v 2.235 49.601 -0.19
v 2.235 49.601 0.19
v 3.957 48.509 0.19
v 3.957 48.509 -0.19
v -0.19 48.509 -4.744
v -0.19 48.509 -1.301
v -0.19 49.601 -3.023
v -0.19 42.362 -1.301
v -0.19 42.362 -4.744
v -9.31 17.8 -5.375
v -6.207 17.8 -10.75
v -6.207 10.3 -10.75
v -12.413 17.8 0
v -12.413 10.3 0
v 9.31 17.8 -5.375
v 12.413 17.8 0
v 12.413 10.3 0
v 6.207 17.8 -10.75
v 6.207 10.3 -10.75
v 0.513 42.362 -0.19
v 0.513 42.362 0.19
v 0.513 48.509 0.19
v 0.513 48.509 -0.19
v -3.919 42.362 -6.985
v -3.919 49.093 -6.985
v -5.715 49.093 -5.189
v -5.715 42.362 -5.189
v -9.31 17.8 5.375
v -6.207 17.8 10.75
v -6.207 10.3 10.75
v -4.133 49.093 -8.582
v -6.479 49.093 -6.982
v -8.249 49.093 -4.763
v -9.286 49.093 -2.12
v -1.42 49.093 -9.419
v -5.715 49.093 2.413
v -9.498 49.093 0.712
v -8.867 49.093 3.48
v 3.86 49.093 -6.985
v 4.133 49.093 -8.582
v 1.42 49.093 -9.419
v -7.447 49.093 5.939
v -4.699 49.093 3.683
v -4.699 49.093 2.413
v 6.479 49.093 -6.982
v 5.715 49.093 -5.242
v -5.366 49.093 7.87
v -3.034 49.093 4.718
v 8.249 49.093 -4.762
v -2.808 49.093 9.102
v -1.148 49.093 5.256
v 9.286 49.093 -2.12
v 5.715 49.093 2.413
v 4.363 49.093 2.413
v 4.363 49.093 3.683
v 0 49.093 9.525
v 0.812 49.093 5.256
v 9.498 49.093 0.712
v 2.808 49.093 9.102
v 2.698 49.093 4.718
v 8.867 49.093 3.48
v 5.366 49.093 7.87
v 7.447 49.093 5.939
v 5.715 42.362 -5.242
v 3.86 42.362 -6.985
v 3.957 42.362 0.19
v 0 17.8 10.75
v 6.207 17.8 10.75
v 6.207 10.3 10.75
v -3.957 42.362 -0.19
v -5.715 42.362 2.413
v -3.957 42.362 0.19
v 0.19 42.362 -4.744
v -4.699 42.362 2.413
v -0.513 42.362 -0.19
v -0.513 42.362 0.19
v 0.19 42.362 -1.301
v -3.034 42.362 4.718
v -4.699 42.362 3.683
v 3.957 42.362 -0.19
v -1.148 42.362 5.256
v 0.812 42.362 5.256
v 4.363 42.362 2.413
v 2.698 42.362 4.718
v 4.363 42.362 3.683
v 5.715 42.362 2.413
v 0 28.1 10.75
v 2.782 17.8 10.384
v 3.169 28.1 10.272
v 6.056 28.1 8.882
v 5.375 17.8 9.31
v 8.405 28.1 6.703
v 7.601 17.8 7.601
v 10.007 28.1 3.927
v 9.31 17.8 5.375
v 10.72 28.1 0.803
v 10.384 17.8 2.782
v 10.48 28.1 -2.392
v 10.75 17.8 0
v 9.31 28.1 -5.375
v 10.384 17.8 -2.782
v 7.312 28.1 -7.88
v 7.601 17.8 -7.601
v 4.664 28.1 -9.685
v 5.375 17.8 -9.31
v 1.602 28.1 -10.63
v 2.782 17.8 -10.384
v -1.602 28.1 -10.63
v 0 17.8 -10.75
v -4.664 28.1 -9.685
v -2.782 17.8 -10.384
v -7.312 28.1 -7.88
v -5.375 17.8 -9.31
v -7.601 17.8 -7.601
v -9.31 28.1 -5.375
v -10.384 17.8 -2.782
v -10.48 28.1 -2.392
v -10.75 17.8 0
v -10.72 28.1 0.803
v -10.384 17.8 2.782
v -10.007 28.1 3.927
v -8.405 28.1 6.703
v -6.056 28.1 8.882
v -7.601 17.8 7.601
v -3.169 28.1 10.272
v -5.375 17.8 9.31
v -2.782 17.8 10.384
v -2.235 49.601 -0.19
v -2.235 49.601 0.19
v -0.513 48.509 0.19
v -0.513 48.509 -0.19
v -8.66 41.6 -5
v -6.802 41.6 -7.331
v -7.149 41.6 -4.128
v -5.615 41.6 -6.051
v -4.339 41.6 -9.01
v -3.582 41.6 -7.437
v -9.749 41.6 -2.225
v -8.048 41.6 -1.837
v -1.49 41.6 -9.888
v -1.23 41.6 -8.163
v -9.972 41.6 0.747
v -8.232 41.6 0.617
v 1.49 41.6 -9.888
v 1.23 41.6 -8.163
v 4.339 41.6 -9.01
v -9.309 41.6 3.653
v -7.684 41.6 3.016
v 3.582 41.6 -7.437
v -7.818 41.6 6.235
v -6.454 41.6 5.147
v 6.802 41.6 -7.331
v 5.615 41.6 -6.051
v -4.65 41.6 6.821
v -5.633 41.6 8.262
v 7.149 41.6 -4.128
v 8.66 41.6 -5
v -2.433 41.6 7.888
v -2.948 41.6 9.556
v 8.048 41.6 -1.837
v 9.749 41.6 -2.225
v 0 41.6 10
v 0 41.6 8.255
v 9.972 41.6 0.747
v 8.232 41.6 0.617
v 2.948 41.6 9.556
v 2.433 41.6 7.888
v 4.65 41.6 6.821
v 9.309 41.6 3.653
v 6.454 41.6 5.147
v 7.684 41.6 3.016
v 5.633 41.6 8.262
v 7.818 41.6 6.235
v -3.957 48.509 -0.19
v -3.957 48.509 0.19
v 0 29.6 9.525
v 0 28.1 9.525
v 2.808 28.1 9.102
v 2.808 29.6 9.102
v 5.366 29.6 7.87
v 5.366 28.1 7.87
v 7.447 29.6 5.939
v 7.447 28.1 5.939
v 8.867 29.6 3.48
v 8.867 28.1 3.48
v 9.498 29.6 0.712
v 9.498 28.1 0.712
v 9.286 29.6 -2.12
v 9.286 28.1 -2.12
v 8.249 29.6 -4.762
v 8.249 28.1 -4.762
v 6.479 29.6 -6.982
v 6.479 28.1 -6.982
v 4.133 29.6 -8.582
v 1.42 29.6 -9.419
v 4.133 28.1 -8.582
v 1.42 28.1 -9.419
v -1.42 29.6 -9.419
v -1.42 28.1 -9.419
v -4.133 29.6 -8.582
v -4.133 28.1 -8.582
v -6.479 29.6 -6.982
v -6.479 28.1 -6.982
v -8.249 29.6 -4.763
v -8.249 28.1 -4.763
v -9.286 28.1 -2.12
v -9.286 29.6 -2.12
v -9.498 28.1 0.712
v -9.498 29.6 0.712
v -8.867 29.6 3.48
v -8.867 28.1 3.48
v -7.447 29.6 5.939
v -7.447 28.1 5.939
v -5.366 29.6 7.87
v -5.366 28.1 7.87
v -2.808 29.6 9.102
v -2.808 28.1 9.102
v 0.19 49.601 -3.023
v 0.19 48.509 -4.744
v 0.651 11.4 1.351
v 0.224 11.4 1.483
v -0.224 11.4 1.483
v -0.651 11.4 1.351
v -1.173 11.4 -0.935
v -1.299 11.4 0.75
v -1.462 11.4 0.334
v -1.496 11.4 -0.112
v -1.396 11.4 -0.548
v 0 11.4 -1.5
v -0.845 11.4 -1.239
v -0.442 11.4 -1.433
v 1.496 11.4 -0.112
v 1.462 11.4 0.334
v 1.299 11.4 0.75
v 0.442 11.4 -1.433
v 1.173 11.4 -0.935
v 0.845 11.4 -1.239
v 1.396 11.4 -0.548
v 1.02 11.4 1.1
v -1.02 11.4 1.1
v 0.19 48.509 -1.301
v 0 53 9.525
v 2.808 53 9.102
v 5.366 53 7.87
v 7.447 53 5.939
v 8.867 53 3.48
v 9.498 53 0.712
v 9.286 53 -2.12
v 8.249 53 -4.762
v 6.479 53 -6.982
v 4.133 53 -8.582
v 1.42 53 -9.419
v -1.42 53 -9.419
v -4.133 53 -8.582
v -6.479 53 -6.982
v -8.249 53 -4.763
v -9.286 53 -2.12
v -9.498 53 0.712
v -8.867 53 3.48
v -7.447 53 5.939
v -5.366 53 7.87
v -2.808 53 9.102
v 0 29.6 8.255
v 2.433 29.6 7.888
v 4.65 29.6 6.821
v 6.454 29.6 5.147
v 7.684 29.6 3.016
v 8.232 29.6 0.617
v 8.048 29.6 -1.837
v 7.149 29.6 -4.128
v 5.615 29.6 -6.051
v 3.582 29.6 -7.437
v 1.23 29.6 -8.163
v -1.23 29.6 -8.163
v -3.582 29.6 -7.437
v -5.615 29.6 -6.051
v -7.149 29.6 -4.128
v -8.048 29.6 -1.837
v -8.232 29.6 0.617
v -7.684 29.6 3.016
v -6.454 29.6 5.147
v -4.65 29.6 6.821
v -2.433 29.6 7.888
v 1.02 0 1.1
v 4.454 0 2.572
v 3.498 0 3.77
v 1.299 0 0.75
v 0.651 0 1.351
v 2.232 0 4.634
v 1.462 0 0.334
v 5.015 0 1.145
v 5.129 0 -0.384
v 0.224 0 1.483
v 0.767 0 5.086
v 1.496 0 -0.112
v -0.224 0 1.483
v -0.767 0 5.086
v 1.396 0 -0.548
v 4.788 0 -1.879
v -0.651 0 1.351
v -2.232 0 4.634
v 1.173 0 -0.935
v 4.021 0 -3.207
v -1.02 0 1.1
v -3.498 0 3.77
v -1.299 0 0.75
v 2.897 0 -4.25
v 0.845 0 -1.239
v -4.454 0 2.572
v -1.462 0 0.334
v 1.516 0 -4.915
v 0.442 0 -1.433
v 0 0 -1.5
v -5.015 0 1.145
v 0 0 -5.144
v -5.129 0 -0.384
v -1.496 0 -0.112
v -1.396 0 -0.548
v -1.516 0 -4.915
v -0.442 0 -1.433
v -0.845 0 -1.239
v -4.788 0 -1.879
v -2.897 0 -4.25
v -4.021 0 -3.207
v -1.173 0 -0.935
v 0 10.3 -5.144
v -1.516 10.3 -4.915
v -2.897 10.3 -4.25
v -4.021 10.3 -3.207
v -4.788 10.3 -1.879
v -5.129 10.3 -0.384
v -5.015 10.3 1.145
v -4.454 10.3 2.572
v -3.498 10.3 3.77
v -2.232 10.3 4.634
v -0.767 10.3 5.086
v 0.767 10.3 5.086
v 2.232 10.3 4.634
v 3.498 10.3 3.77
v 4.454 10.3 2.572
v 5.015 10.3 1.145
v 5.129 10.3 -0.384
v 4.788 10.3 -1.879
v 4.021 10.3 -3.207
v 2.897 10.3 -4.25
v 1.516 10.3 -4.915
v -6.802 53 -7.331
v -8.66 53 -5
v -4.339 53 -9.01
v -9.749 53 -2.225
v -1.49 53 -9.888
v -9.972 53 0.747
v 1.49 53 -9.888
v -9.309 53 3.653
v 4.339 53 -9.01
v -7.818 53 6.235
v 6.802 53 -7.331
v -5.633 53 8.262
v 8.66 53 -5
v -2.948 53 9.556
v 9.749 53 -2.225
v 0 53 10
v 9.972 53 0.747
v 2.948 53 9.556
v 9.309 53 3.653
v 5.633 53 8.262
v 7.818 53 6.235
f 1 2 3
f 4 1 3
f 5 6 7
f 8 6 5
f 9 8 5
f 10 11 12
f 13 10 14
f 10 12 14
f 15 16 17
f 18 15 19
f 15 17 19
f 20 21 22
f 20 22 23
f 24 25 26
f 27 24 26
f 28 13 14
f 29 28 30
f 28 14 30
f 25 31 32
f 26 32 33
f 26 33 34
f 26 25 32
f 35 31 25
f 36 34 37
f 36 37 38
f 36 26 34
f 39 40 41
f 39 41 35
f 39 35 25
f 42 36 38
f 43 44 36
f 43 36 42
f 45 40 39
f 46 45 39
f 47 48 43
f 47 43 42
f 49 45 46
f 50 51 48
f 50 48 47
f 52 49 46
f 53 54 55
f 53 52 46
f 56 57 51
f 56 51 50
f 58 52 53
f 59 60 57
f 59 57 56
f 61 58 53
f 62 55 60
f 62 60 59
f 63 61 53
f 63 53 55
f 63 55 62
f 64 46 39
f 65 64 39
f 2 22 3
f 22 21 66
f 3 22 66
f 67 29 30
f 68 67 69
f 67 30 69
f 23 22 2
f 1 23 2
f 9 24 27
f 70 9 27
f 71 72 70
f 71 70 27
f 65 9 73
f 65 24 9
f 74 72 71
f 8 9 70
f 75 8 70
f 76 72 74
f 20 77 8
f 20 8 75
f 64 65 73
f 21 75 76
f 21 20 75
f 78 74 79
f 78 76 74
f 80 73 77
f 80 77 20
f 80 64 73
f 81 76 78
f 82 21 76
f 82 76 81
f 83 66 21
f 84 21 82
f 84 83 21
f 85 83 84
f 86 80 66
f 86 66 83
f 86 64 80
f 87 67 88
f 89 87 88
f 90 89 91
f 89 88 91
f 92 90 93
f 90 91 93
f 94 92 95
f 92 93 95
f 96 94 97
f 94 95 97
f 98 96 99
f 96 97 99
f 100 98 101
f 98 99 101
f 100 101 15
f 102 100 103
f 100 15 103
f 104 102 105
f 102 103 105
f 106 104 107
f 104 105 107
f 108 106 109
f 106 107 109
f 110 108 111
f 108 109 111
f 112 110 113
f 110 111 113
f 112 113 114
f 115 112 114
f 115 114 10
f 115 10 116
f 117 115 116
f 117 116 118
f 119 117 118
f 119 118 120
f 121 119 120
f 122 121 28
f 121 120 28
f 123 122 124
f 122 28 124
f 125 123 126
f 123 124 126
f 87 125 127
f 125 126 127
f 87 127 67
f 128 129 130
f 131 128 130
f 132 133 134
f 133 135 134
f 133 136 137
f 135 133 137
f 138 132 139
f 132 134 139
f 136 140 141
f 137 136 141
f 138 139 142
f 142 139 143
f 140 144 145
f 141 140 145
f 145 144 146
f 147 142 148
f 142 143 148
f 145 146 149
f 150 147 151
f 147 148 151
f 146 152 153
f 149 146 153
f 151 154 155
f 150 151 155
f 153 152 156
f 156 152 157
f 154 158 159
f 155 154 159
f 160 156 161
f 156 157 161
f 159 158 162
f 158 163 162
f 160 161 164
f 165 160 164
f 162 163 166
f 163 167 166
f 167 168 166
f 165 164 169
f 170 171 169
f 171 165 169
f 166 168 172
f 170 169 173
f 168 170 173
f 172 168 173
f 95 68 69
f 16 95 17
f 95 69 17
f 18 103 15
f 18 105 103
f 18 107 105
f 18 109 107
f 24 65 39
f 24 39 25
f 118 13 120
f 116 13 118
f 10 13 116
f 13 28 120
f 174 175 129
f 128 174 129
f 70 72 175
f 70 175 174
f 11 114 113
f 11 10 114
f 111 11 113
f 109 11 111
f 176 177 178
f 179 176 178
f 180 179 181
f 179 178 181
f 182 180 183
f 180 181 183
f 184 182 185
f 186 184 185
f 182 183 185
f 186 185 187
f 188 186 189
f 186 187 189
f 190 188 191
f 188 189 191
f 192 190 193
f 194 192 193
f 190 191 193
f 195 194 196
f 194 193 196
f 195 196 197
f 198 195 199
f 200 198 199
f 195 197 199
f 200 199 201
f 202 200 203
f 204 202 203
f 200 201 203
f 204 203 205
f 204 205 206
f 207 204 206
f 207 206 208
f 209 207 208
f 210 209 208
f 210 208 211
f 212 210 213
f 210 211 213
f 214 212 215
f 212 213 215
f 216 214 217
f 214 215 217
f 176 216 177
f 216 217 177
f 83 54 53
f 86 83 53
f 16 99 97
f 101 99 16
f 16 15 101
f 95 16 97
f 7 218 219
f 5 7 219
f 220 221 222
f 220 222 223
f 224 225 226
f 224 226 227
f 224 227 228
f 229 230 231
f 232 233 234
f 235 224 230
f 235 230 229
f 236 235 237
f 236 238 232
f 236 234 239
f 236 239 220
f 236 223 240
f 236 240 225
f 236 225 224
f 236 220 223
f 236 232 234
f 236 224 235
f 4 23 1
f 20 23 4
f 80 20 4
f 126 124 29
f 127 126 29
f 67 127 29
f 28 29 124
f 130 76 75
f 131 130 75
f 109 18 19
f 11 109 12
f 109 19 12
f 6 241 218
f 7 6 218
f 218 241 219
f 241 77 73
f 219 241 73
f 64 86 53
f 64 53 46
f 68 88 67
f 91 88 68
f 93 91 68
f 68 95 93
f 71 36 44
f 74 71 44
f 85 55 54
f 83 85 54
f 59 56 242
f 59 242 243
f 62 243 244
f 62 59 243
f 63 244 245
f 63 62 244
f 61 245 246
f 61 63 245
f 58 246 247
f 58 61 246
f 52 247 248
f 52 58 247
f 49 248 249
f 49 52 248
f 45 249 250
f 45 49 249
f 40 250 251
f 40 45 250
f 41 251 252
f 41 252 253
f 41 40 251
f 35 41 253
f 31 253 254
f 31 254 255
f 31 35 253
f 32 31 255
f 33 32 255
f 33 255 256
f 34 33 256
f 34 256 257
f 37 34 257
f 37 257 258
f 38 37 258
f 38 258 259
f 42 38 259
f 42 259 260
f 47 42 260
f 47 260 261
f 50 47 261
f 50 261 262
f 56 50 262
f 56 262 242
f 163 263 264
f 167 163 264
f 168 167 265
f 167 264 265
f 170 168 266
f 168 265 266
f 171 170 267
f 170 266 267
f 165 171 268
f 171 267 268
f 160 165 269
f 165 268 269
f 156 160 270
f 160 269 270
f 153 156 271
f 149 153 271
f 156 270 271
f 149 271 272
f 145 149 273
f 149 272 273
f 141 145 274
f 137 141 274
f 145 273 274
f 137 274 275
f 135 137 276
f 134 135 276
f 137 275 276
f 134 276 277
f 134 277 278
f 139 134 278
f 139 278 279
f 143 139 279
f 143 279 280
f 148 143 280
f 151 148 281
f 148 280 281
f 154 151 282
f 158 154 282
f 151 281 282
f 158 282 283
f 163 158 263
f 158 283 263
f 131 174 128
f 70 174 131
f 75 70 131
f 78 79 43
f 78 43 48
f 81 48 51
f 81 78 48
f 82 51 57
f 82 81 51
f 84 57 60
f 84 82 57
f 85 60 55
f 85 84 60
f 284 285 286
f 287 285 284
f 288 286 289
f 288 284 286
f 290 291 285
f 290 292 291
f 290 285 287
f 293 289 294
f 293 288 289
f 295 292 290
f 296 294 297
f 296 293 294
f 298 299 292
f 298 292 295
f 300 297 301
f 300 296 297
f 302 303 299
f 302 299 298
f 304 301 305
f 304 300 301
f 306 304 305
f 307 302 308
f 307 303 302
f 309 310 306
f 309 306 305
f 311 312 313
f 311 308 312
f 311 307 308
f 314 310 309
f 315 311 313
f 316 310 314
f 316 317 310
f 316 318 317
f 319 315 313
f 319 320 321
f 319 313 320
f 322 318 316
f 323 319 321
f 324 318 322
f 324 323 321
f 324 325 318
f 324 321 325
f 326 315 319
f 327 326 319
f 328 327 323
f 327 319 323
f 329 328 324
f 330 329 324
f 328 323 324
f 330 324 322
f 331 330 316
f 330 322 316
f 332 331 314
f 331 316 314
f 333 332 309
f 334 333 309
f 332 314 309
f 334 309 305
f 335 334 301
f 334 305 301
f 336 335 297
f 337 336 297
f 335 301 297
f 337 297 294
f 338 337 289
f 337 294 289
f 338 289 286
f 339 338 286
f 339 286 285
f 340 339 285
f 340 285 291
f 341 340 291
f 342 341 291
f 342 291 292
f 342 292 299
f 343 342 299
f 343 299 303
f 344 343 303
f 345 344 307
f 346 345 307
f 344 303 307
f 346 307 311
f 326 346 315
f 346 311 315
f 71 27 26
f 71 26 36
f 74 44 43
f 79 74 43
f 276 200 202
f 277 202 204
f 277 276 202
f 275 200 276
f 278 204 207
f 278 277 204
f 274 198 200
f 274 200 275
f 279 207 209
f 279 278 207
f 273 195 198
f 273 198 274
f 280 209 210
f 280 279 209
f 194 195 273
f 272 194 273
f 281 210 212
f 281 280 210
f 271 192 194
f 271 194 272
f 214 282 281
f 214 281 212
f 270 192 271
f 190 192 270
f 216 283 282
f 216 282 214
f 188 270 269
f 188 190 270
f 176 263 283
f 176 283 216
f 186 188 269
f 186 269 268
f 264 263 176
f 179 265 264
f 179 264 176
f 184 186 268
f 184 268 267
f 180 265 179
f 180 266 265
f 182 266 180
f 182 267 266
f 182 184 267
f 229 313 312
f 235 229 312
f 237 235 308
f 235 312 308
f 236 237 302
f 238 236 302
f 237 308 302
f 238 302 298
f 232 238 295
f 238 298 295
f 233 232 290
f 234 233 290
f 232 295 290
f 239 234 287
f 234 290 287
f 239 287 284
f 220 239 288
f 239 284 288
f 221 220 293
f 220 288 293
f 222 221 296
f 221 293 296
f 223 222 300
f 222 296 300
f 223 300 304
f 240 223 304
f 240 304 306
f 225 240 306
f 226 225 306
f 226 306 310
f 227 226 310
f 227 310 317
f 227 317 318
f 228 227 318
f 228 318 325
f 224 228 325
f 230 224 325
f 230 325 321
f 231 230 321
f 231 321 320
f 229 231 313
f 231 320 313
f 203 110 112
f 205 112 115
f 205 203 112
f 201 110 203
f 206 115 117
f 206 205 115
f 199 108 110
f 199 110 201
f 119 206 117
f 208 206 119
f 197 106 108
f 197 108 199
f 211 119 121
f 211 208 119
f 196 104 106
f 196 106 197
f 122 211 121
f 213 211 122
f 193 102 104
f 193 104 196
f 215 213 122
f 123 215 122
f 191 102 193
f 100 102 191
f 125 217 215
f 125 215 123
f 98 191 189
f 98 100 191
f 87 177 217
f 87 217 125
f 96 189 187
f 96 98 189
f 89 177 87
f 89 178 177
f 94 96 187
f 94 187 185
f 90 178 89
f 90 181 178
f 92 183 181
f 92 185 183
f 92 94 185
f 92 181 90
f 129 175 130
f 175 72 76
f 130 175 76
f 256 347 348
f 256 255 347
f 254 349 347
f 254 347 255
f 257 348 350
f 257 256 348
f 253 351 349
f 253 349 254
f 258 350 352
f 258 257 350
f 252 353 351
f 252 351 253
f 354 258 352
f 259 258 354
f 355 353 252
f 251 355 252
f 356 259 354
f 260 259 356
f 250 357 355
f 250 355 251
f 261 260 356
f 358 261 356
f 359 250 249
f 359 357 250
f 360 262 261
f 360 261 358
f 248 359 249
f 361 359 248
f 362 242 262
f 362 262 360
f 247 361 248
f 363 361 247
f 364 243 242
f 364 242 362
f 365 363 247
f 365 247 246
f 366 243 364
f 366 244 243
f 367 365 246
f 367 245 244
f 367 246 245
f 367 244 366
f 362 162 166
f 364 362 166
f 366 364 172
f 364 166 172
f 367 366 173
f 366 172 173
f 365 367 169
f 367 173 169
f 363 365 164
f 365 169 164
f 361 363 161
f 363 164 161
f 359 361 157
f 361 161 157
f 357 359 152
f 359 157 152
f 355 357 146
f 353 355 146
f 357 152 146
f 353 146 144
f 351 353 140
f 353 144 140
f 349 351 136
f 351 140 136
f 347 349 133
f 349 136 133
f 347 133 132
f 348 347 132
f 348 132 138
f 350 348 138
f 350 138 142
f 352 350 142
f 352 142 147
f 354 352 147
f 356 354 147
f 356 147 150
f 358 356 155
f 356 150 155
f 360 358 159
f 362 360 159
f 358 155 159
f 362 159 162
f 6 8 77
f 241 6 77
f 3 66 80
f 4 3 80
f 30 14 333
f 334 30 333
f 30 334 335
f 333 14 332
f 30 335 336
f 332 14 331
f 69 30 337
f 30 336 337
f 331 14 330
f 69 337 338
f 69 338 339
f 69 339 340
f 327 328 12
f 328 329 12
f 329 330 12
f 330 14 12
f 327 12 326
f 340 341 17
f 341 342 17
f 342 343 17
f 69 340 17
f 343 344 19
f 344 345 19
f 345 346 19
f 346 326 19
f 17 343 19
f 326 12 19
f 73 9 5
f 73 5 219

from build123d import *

# Parameters (mm, degrees)
SKETCH1_R           = 5.1435
BOSS_EXTRUDE1_DEPTH = 10.3
BOSS_EXTRUDE2_DEPTH = 7.5
SKETCH3_R           = 10.75
BOSS_EXTRUDE3_DEPTH = 10.3
SKETCH4_R           = 9.525
BOSS_EXTRUDE4_DEPTH = 1.5
SKETCH5_R           = 8.255
BOSS_EXTRUDE5_DEPTH = 12
SKETCH6_R           = 10
BOSS_EXTRUDE6_DEPTH = 11.4
SKETCH7_R           = 4.3053
CUT_EXTRUDE1_DEPTH  = 11.4
SKETCH28_R          = 4.3053
BOSS_EXTRUDE7_DEPTH = 11.4
SKETCH29_R          = 1.5
CUT_EXTRUDE2_DEPTH  = 11.4
CUT_EXTRUDE6_START  = -10.638
SKETCH30_R          = 9.525
CUT_EXTRUDE6_DEPTH  = 10.638
SKETCH31_W          = 0.381
SKETCH31_H          = 3.44369911
SKETCH31_W_2        = 3.44369911
SKETCH31_H_2        = 0.381
BOSS_EXTRUDE8_DEPTH = 7.239
CUT_EXTRUDE7_DEPTH  = 6.731
CUT_EXTRUDE8_DEPTH  = 1.651
CUT_EXTRUDE9_DEPTH  = 1.651
SKETCH35_R          = 9.525
BOSS_EXTRUDE9_DEPTH = 6.731


with BuildPart() as part:
    # Sketch1 → Boss-Extrude1 (new body)
    with BuildSketch(Plane(origin=(0, 0, 0), x_dir=(1, 0, 0), z_dir=(0, 1, 0))):
        with Locations(Location((0, 0, 0), (0, 0, 90))):
            Circle(SKETCH1_R)
    extrude(amount=BOSS_EXTRUDE1_DEPTH)

    # Sketch2 → Boss-Extrude2 (add)
    with BuildSketch(Plane(origin=(0, 10.3, 0), x_dir=(1, 0, 0), z_dir=(0, 1, 0))):
        Polygon((6.206515394, 10.75), (-6.206515394, 10.75), (-12.413030788, 0), (-6.206515394, -10.75), (6.206515394, -10.75), (12.413030788, 0), align=None)
    extrude(amount=BOSS_EXTRUDE2_DEPTH)

    # Sketch3 → Boss-Extrude3 (add)
    with BuildSketch(Plane(origin=(0, 17.8, 0), x_dir=(1, 0, 0), z_dir=(0, 1, 0))):
        with Locations(Location((0, 0, 0), (0, 0, 270))):
            Circle(SKETCH3_R)
    extrude(amount=BOSS_EXTRUDE3_DEPTH)

    # Sketch4 → Boss-Extrude4 (add)
    with BuildSketch(Plane(origin=(0, 28.1, 0), x_dir=(1, 0, 0), z_dir=(0, 1, 0))):
        with Locations(Location((0, 0, 0), (0, 0, 270))):
            Circle(SKETCH4_R)
    extrude(amount=BOSS_EXTRUDE4_DEPTH)

    # Sketch5 → Boss-Extrude5 (add)
    with BuildSketch(Plane(origin=(0, 29.6, 0), x_dir=(1, 0, 0), z_dir=(0, 1, 0))):
        with Locations(Location((0, 0, 0), (0, 0, 270))):
            Circle(SKETCH5_R)
    extrude(amount=BOSS_EXTRUDE5_DEPTH)

    # Sketch6 → Boss-Extrude6 (add)
    with BuildSketch(Plane(origin=(0, 41.6, 0), x_dir=(1, 0, 0), z_dir=(0, 1, 0))):
        with Locations(Location((0, 0, 0), (0, 0, 270))):
            Circle(SKETCH6_R)
    extrude(amount=BOSS_EXTRUDE6_DEPTH)

    # Sketch7 → Cut-Extrude1 (cut)
    with BuildSketch(Plane.XZ):
        with Locations(Location((0, 0, 0), (0, 0, 270))):
            Circle(SKETCH7_R)
    extrude(amount=-CUT_EXTRUDE1_DEPTH, mode=Mode.SUBTRACT)

    # Sketch28 → Boss-Extrude7 (add)
    with BuildSketch(Plane(origin=(0, 0, 0), x_dir=(-1, 0, 0), z_dir=(0, -1, 0))):
        Circle(SKETCH28_R)
    extrude(amount=-BOSS_EXTRUDE7_DEPTH)

    # Sketch29 → Cut-Extrude2 (cut)
    with BuildSketch(Plane.XZ):
        with Locations(Location((0, 0, 0), (0, 0, 270))):
            Circle(SKETCH29_R)
    extrude(amount=-CUT_EXTRUDE2_DEPTH, mode=Mode.SUBTRACT)

    # Sketch30 → Cut-Extrude6 (cut)
    with BuildSketch(Plane(origin=(0, 53, 0), x_dir=(1, 0, 0), z_dir=(0, 1, 0)).offset(CUT_EXTRUDE6_START)):
        with Locations(Location((0, 0, 0), (0, 0, 270))):
            Circle(SKETCH30_R)
    extrude(amount=CUT_EXTRUDE6_DEPTH, mode=Mode.SUBTRACT)

    # Sketch31 → Boss-Extrude8 (add)
    with BuildSketch(Plane(origin=(0, 42.362, 0), x_dir=(1, 0, 0), z_dir=(0, 1, 0))):
        with Locations((0, 3.0226)):
            Rectangle(SKETCH31_W, SKETCH31_H)
        with Locations((-2.2352, 0)):
            Rectangle(SKETCH31_W_2, SKETCH31_H_2)
        with Locations((2.2352, 0)):
            Rectangle(SKETCH31_W_2, SKETCH31_H_2)
    extrude(amount=BOSS_EXTRUDE8_DEPTH)

    # Sketch32 → Cut-Extrude7 (cut)
    with BuildSketch(Plane.XY.offset(0.1905)):
        Polygon((-3.957049555, 48.5088), (-2.2352, 49.601), (-3.957049555, 49.601), align=None)
        Polygon((-0.513350445, 49.601), (-2.2352, 49.601), (-0.513350445, 48.5088), align=None)
    extrude(amount=-CUT_EXTRUDE7_DEPTH, mode=Mode.SUBTRACT)

    # Sketch33 → Cut-Extrude8 (cut)
    with BuildSketch(Plane.XY.offset(0.1905)):
        Polygon((0.513350445, 48.5088), (2.2352, 49.601), (0.513350445, 49.601), align=None)
        Polygon((3.957049555, 49.601), (2.2352, 49.601), (3.957049555, 48.5088), align=None)
    extrude(amount=-CUT_EXTRUDE8_DEPTH, mode=Mode.SUBTRACT)

    # Sketch34 → Cut-Extrude9 (cut)
    with BuildSketch(Plane(origin=(0.1905, 0, 0), x_dir=(0, 0, -1), z_dir=(1, 0, 0))):
        Polygon((1.300750445, 48.5088), (3.0226, 49.601), (1.300750445, 49.601), align=None)
        Polygon((4.744449555, 49.601), (3.0226, 49.601), (4.744449555, 48.5088), align=None)
    extrude(amount=-CUT_EXTRUDE9_DEPTH, mode=Mode.SUBTRACT)

    # Sketch35 → Boss-Extrude9 (add)
    with BuildSketch(Plane(origin=(0, 42.362, 0), x_dir=(1, 0, 0), z_dir=(0, 1, 0))):
        with Locations(Location((0, 0, 0), (0, 0, 270))):
            Circle(SKETCH35_R)
        with BuildLine():
            ThreePointArc((-4.699, -3.683), (-0.167968835, -5.324730553), (4.363062329, -3.683))
            Line((4.363062329, -3.683), (4.363062329, -2.413))
            Line((4.363062329, -2.413), (5.715, -2.413))
            Line((5.715, -2.413), (5.715, 5.24229274))
            Line((5.715, 5.24229274), (3.860385896, 6.985))
            Line((3.860385896, 6.985), (-3.918948776, 6.985))
            Line((-3.918948776, 6.985), (-5.715, 5.188948776))
            Line((-5.715, 5.188948776), (-5.715, -2.413))
            Line((-5.715, -2.413), (-4.699, -2.413))
            Line((-4.699, -2.413), (-4.699, -3.683))
        make_face(mode=Mode.SUBTRACT)
    extrude(amount=BOSS_EXTRUDE9_DEPTH)


solid = part.part
